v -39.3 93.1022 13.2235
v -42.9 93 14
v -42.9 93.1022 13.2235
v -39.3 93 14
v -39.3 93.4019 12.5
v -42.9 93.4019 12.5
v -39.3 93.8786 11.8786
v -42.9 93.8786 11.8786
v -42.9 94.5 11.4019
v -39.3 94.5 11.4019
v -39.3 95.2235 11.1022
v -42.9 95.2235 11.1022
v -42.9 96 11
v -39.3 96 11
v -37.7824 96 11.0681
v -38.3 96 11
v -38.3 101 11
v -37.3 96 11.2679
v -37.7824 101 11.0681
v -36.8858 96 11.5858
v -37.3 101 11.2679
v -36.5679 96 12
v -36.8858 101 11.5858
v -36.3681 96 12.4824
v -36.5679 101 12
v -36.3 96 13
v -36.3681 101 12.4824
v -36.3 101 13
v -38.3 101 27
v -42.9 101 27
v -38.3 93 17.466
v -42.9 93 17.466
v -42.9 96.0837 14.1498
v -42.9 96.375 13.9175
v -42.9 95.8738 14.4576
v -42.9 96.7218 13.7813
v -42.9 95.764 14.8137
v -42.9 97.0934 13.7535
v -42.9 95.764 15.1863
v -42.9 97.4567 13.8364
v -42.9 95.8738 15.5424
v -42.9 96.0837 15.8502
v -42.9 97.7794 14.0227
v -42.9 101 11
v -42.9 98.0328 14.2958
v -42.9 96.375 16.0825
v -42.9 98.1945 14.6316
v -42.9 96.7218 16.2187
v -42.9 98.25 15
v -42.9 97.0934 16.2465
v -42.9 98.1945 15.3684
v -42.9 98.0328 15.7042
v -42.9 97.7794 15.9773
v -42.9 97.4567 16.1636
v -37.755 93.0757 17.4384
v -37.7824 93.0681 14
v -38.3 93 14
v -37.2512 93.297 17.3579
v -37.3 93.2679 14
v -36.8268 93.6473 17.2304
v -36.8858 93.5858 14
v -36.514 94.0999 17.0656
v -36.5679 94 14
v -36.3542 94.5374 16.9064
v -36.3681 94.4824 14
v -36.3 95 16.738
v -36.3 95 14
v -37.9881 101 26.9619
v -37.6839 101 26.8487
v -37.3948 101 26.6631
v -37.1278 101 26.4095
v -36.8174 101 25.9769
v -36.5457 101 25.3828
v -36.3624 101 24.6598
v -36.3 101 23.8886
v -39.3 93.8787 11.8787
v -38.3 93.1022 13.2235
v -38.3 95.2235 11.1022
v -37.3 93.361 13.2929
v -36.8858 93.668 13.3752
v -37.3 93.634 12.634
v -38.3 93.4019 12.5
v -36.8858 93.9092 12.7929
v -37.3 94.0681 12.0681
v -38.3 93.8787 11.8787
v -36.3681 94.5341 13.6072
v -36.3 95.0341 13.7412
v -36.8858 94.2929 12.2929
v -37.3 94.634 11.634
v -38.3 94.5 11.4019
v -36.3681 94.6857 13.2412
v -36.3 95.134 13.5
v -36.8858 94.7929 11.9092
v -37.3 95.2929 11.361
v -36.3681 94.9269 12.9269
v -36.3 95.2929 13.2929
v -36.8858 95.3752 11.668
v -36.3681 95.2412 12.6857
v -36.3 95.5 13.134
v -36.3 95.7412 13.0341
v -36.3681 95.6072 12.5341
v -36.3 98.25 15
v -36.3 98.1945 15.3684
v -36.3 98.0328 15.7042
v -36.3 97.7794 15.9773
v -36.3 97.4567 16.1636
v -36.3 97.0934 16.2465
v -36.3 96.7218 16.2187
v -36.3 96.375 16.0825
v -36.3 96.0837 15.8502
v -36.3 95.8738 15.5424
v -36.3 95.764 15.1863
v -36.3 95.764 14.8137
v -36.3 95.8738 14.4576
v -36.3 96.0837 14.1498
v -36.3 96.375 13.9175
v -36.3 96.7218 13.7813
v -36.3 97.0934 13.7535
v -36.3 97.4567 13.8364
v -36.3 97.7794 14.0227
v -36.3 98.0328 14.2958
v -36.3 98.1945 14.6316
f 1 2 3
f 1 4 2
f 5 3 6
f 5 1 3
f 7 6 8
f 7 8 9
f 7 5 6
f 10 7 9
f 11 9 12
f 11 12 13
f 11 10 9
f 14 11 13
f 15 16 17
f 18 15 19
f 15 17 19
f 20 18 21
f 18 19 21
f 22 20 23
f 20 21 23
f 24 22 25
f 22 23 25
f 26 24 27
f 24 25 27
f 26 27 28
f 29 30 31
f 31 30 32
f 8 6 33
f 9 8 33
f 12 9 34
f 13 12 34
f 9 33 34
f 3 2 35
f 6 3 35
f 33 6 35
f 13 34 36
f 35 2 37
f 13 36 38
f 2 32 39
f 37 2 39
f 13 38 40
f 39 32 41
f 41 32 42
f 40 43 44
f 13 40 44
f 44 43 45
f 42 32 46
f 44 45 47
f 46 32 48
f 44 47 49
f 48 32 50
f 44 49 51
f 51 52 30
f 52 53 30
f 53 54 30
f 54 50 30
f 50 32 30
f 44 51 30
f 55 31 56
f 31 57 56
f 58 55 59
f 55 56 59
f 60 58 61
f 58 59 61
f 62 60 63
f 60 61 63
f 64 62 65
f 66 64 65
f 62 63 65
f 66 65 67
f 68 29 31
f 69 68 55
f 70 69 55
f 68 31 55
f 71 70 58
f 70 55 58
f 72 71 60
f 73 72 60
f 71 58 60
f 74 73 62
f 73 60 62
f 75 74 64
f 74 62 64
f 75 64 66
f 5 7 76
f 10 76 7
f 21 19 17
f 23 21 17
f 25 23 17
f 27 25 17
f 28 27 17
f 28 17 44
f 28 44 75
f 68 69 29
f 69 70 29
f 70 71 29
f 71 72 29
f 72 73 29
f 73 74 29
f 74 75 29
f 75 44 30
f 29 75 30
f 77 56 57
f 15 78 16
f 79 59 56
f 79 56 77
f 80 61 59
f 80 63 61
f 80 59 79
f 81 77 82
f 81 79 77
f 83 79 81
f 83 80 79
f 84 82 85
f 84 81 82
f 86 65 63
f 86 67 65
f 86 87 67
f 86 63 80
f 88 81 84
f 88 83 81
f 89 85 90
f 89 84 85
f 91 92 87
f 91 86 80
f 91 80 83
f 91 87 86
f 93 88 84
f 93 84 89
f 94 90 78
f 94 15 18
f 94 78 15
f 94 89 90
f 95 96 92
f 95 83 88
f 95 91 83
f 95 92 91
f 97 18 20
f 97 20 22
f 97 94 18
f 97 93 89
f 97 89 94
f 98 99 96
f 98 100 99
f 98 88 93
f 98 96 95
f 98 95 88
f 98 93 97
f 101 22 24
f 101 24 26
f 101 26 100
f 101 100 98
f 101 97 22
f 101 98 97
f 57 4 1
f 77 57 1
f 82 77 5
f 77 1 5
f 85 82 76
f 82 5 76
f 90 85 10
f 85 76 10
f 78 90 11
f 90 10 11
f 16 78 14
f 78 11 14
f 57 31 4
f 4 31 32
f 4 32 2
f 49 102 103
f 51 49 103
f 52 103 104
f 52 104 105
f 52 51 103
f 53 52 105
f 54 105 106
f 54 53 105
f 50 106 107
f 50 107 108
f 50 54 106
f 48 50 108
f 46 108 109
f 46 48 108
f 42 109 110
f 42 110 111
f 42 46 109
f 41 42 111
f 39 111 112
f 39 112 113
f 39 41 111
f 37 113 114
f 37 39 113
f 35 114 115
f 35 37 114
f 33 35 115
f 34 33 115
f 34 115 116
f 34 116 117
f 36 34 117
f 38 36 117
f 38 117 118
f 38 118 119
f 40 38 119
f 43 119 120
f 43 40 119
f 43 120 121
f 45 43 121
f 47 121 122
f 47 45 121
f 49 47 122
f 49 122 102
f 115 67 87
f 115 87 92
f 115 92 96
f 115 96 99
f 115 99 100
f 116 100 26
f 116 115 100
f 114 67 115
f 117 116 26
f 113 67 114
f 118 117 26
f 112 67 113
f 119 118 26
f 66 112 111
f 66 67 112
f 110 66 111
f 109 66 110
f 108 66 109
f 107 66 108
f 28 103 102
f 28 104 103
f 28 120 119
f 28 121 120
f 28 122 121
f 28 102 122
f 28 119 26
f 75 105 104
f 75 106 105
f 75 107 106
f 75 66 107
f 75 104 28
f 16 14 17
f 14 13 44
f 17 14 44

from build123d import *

# Parameters (mm, degrees)
SKETCH062_R  = 1.25
PAD029_DEPTH = 1.8
SKETCH063_R  = 1.25
PAD031_DEPTH = 3
FILLET003_R  = 2


with BuildPart() as part:
    # Sketch062 → Pad029 (new body, symmetric)
    with BuildSketch(Plane.YZ.offset(-41.1)):
        with BuildLine():
            Line((96.000005, 10.999996), (100.999998, 10.999996))
            Line((100.999998, 10.999996), (100.999998, 27))
            Line((100.999998, 27), (92.999998, 17.465971))
            Line((92.999998, 14), (92.999998, 17.465971))
            ThreePointArc((92.999998, 14), (93.878624, 11.87862), (96.000005, 10.999996))
        make_face()
        with Locations((97, 15)):
            Circle(SKETCH062_R, mode=Mode.SUBTRACT)
    extrude(amount=PAD029_DEPTH, both=True)

    # Sketch063 (on Face8 of Clone025) → Pad031 (new body)
    with BuildSketch(Plane.YZ.offset(-39.3)):
        with BuildLine():
            Line((100.999998, 27), (92.999998, 17.465971))
            Line((92.999998, 17.465971), (92.999998, 14))
            ThreePointArc((92.999998, 14), (93.87868, 11.878676), (96.000005, 10.999996))
            Line((96.000005, 10.999996), (100.999998, 10.999996))
            Line((100.999998, 10.999996), (100.999998, 27))
        make_face()
        with Locations((97, 15)):
            Circle(SKETCH063_R, mode=Mode.SUBTRACT)
    extrude(amount=PAD031_DEPTH)

    # Fillet003
    fillet003_edges = [part.edges().sort_by_distance(p)[0] for p in [
        (-36.3, 98.500001, 10.999996),
        (-36.3, 93.87868, 11.878676),
        (-36.3, 92.999998, 15.732986),
        (-36.3, 96.999998, 22.232986),
    ]]
    fillet(fillet003_edges, radius=FILLET003_R)


solid = part.part
